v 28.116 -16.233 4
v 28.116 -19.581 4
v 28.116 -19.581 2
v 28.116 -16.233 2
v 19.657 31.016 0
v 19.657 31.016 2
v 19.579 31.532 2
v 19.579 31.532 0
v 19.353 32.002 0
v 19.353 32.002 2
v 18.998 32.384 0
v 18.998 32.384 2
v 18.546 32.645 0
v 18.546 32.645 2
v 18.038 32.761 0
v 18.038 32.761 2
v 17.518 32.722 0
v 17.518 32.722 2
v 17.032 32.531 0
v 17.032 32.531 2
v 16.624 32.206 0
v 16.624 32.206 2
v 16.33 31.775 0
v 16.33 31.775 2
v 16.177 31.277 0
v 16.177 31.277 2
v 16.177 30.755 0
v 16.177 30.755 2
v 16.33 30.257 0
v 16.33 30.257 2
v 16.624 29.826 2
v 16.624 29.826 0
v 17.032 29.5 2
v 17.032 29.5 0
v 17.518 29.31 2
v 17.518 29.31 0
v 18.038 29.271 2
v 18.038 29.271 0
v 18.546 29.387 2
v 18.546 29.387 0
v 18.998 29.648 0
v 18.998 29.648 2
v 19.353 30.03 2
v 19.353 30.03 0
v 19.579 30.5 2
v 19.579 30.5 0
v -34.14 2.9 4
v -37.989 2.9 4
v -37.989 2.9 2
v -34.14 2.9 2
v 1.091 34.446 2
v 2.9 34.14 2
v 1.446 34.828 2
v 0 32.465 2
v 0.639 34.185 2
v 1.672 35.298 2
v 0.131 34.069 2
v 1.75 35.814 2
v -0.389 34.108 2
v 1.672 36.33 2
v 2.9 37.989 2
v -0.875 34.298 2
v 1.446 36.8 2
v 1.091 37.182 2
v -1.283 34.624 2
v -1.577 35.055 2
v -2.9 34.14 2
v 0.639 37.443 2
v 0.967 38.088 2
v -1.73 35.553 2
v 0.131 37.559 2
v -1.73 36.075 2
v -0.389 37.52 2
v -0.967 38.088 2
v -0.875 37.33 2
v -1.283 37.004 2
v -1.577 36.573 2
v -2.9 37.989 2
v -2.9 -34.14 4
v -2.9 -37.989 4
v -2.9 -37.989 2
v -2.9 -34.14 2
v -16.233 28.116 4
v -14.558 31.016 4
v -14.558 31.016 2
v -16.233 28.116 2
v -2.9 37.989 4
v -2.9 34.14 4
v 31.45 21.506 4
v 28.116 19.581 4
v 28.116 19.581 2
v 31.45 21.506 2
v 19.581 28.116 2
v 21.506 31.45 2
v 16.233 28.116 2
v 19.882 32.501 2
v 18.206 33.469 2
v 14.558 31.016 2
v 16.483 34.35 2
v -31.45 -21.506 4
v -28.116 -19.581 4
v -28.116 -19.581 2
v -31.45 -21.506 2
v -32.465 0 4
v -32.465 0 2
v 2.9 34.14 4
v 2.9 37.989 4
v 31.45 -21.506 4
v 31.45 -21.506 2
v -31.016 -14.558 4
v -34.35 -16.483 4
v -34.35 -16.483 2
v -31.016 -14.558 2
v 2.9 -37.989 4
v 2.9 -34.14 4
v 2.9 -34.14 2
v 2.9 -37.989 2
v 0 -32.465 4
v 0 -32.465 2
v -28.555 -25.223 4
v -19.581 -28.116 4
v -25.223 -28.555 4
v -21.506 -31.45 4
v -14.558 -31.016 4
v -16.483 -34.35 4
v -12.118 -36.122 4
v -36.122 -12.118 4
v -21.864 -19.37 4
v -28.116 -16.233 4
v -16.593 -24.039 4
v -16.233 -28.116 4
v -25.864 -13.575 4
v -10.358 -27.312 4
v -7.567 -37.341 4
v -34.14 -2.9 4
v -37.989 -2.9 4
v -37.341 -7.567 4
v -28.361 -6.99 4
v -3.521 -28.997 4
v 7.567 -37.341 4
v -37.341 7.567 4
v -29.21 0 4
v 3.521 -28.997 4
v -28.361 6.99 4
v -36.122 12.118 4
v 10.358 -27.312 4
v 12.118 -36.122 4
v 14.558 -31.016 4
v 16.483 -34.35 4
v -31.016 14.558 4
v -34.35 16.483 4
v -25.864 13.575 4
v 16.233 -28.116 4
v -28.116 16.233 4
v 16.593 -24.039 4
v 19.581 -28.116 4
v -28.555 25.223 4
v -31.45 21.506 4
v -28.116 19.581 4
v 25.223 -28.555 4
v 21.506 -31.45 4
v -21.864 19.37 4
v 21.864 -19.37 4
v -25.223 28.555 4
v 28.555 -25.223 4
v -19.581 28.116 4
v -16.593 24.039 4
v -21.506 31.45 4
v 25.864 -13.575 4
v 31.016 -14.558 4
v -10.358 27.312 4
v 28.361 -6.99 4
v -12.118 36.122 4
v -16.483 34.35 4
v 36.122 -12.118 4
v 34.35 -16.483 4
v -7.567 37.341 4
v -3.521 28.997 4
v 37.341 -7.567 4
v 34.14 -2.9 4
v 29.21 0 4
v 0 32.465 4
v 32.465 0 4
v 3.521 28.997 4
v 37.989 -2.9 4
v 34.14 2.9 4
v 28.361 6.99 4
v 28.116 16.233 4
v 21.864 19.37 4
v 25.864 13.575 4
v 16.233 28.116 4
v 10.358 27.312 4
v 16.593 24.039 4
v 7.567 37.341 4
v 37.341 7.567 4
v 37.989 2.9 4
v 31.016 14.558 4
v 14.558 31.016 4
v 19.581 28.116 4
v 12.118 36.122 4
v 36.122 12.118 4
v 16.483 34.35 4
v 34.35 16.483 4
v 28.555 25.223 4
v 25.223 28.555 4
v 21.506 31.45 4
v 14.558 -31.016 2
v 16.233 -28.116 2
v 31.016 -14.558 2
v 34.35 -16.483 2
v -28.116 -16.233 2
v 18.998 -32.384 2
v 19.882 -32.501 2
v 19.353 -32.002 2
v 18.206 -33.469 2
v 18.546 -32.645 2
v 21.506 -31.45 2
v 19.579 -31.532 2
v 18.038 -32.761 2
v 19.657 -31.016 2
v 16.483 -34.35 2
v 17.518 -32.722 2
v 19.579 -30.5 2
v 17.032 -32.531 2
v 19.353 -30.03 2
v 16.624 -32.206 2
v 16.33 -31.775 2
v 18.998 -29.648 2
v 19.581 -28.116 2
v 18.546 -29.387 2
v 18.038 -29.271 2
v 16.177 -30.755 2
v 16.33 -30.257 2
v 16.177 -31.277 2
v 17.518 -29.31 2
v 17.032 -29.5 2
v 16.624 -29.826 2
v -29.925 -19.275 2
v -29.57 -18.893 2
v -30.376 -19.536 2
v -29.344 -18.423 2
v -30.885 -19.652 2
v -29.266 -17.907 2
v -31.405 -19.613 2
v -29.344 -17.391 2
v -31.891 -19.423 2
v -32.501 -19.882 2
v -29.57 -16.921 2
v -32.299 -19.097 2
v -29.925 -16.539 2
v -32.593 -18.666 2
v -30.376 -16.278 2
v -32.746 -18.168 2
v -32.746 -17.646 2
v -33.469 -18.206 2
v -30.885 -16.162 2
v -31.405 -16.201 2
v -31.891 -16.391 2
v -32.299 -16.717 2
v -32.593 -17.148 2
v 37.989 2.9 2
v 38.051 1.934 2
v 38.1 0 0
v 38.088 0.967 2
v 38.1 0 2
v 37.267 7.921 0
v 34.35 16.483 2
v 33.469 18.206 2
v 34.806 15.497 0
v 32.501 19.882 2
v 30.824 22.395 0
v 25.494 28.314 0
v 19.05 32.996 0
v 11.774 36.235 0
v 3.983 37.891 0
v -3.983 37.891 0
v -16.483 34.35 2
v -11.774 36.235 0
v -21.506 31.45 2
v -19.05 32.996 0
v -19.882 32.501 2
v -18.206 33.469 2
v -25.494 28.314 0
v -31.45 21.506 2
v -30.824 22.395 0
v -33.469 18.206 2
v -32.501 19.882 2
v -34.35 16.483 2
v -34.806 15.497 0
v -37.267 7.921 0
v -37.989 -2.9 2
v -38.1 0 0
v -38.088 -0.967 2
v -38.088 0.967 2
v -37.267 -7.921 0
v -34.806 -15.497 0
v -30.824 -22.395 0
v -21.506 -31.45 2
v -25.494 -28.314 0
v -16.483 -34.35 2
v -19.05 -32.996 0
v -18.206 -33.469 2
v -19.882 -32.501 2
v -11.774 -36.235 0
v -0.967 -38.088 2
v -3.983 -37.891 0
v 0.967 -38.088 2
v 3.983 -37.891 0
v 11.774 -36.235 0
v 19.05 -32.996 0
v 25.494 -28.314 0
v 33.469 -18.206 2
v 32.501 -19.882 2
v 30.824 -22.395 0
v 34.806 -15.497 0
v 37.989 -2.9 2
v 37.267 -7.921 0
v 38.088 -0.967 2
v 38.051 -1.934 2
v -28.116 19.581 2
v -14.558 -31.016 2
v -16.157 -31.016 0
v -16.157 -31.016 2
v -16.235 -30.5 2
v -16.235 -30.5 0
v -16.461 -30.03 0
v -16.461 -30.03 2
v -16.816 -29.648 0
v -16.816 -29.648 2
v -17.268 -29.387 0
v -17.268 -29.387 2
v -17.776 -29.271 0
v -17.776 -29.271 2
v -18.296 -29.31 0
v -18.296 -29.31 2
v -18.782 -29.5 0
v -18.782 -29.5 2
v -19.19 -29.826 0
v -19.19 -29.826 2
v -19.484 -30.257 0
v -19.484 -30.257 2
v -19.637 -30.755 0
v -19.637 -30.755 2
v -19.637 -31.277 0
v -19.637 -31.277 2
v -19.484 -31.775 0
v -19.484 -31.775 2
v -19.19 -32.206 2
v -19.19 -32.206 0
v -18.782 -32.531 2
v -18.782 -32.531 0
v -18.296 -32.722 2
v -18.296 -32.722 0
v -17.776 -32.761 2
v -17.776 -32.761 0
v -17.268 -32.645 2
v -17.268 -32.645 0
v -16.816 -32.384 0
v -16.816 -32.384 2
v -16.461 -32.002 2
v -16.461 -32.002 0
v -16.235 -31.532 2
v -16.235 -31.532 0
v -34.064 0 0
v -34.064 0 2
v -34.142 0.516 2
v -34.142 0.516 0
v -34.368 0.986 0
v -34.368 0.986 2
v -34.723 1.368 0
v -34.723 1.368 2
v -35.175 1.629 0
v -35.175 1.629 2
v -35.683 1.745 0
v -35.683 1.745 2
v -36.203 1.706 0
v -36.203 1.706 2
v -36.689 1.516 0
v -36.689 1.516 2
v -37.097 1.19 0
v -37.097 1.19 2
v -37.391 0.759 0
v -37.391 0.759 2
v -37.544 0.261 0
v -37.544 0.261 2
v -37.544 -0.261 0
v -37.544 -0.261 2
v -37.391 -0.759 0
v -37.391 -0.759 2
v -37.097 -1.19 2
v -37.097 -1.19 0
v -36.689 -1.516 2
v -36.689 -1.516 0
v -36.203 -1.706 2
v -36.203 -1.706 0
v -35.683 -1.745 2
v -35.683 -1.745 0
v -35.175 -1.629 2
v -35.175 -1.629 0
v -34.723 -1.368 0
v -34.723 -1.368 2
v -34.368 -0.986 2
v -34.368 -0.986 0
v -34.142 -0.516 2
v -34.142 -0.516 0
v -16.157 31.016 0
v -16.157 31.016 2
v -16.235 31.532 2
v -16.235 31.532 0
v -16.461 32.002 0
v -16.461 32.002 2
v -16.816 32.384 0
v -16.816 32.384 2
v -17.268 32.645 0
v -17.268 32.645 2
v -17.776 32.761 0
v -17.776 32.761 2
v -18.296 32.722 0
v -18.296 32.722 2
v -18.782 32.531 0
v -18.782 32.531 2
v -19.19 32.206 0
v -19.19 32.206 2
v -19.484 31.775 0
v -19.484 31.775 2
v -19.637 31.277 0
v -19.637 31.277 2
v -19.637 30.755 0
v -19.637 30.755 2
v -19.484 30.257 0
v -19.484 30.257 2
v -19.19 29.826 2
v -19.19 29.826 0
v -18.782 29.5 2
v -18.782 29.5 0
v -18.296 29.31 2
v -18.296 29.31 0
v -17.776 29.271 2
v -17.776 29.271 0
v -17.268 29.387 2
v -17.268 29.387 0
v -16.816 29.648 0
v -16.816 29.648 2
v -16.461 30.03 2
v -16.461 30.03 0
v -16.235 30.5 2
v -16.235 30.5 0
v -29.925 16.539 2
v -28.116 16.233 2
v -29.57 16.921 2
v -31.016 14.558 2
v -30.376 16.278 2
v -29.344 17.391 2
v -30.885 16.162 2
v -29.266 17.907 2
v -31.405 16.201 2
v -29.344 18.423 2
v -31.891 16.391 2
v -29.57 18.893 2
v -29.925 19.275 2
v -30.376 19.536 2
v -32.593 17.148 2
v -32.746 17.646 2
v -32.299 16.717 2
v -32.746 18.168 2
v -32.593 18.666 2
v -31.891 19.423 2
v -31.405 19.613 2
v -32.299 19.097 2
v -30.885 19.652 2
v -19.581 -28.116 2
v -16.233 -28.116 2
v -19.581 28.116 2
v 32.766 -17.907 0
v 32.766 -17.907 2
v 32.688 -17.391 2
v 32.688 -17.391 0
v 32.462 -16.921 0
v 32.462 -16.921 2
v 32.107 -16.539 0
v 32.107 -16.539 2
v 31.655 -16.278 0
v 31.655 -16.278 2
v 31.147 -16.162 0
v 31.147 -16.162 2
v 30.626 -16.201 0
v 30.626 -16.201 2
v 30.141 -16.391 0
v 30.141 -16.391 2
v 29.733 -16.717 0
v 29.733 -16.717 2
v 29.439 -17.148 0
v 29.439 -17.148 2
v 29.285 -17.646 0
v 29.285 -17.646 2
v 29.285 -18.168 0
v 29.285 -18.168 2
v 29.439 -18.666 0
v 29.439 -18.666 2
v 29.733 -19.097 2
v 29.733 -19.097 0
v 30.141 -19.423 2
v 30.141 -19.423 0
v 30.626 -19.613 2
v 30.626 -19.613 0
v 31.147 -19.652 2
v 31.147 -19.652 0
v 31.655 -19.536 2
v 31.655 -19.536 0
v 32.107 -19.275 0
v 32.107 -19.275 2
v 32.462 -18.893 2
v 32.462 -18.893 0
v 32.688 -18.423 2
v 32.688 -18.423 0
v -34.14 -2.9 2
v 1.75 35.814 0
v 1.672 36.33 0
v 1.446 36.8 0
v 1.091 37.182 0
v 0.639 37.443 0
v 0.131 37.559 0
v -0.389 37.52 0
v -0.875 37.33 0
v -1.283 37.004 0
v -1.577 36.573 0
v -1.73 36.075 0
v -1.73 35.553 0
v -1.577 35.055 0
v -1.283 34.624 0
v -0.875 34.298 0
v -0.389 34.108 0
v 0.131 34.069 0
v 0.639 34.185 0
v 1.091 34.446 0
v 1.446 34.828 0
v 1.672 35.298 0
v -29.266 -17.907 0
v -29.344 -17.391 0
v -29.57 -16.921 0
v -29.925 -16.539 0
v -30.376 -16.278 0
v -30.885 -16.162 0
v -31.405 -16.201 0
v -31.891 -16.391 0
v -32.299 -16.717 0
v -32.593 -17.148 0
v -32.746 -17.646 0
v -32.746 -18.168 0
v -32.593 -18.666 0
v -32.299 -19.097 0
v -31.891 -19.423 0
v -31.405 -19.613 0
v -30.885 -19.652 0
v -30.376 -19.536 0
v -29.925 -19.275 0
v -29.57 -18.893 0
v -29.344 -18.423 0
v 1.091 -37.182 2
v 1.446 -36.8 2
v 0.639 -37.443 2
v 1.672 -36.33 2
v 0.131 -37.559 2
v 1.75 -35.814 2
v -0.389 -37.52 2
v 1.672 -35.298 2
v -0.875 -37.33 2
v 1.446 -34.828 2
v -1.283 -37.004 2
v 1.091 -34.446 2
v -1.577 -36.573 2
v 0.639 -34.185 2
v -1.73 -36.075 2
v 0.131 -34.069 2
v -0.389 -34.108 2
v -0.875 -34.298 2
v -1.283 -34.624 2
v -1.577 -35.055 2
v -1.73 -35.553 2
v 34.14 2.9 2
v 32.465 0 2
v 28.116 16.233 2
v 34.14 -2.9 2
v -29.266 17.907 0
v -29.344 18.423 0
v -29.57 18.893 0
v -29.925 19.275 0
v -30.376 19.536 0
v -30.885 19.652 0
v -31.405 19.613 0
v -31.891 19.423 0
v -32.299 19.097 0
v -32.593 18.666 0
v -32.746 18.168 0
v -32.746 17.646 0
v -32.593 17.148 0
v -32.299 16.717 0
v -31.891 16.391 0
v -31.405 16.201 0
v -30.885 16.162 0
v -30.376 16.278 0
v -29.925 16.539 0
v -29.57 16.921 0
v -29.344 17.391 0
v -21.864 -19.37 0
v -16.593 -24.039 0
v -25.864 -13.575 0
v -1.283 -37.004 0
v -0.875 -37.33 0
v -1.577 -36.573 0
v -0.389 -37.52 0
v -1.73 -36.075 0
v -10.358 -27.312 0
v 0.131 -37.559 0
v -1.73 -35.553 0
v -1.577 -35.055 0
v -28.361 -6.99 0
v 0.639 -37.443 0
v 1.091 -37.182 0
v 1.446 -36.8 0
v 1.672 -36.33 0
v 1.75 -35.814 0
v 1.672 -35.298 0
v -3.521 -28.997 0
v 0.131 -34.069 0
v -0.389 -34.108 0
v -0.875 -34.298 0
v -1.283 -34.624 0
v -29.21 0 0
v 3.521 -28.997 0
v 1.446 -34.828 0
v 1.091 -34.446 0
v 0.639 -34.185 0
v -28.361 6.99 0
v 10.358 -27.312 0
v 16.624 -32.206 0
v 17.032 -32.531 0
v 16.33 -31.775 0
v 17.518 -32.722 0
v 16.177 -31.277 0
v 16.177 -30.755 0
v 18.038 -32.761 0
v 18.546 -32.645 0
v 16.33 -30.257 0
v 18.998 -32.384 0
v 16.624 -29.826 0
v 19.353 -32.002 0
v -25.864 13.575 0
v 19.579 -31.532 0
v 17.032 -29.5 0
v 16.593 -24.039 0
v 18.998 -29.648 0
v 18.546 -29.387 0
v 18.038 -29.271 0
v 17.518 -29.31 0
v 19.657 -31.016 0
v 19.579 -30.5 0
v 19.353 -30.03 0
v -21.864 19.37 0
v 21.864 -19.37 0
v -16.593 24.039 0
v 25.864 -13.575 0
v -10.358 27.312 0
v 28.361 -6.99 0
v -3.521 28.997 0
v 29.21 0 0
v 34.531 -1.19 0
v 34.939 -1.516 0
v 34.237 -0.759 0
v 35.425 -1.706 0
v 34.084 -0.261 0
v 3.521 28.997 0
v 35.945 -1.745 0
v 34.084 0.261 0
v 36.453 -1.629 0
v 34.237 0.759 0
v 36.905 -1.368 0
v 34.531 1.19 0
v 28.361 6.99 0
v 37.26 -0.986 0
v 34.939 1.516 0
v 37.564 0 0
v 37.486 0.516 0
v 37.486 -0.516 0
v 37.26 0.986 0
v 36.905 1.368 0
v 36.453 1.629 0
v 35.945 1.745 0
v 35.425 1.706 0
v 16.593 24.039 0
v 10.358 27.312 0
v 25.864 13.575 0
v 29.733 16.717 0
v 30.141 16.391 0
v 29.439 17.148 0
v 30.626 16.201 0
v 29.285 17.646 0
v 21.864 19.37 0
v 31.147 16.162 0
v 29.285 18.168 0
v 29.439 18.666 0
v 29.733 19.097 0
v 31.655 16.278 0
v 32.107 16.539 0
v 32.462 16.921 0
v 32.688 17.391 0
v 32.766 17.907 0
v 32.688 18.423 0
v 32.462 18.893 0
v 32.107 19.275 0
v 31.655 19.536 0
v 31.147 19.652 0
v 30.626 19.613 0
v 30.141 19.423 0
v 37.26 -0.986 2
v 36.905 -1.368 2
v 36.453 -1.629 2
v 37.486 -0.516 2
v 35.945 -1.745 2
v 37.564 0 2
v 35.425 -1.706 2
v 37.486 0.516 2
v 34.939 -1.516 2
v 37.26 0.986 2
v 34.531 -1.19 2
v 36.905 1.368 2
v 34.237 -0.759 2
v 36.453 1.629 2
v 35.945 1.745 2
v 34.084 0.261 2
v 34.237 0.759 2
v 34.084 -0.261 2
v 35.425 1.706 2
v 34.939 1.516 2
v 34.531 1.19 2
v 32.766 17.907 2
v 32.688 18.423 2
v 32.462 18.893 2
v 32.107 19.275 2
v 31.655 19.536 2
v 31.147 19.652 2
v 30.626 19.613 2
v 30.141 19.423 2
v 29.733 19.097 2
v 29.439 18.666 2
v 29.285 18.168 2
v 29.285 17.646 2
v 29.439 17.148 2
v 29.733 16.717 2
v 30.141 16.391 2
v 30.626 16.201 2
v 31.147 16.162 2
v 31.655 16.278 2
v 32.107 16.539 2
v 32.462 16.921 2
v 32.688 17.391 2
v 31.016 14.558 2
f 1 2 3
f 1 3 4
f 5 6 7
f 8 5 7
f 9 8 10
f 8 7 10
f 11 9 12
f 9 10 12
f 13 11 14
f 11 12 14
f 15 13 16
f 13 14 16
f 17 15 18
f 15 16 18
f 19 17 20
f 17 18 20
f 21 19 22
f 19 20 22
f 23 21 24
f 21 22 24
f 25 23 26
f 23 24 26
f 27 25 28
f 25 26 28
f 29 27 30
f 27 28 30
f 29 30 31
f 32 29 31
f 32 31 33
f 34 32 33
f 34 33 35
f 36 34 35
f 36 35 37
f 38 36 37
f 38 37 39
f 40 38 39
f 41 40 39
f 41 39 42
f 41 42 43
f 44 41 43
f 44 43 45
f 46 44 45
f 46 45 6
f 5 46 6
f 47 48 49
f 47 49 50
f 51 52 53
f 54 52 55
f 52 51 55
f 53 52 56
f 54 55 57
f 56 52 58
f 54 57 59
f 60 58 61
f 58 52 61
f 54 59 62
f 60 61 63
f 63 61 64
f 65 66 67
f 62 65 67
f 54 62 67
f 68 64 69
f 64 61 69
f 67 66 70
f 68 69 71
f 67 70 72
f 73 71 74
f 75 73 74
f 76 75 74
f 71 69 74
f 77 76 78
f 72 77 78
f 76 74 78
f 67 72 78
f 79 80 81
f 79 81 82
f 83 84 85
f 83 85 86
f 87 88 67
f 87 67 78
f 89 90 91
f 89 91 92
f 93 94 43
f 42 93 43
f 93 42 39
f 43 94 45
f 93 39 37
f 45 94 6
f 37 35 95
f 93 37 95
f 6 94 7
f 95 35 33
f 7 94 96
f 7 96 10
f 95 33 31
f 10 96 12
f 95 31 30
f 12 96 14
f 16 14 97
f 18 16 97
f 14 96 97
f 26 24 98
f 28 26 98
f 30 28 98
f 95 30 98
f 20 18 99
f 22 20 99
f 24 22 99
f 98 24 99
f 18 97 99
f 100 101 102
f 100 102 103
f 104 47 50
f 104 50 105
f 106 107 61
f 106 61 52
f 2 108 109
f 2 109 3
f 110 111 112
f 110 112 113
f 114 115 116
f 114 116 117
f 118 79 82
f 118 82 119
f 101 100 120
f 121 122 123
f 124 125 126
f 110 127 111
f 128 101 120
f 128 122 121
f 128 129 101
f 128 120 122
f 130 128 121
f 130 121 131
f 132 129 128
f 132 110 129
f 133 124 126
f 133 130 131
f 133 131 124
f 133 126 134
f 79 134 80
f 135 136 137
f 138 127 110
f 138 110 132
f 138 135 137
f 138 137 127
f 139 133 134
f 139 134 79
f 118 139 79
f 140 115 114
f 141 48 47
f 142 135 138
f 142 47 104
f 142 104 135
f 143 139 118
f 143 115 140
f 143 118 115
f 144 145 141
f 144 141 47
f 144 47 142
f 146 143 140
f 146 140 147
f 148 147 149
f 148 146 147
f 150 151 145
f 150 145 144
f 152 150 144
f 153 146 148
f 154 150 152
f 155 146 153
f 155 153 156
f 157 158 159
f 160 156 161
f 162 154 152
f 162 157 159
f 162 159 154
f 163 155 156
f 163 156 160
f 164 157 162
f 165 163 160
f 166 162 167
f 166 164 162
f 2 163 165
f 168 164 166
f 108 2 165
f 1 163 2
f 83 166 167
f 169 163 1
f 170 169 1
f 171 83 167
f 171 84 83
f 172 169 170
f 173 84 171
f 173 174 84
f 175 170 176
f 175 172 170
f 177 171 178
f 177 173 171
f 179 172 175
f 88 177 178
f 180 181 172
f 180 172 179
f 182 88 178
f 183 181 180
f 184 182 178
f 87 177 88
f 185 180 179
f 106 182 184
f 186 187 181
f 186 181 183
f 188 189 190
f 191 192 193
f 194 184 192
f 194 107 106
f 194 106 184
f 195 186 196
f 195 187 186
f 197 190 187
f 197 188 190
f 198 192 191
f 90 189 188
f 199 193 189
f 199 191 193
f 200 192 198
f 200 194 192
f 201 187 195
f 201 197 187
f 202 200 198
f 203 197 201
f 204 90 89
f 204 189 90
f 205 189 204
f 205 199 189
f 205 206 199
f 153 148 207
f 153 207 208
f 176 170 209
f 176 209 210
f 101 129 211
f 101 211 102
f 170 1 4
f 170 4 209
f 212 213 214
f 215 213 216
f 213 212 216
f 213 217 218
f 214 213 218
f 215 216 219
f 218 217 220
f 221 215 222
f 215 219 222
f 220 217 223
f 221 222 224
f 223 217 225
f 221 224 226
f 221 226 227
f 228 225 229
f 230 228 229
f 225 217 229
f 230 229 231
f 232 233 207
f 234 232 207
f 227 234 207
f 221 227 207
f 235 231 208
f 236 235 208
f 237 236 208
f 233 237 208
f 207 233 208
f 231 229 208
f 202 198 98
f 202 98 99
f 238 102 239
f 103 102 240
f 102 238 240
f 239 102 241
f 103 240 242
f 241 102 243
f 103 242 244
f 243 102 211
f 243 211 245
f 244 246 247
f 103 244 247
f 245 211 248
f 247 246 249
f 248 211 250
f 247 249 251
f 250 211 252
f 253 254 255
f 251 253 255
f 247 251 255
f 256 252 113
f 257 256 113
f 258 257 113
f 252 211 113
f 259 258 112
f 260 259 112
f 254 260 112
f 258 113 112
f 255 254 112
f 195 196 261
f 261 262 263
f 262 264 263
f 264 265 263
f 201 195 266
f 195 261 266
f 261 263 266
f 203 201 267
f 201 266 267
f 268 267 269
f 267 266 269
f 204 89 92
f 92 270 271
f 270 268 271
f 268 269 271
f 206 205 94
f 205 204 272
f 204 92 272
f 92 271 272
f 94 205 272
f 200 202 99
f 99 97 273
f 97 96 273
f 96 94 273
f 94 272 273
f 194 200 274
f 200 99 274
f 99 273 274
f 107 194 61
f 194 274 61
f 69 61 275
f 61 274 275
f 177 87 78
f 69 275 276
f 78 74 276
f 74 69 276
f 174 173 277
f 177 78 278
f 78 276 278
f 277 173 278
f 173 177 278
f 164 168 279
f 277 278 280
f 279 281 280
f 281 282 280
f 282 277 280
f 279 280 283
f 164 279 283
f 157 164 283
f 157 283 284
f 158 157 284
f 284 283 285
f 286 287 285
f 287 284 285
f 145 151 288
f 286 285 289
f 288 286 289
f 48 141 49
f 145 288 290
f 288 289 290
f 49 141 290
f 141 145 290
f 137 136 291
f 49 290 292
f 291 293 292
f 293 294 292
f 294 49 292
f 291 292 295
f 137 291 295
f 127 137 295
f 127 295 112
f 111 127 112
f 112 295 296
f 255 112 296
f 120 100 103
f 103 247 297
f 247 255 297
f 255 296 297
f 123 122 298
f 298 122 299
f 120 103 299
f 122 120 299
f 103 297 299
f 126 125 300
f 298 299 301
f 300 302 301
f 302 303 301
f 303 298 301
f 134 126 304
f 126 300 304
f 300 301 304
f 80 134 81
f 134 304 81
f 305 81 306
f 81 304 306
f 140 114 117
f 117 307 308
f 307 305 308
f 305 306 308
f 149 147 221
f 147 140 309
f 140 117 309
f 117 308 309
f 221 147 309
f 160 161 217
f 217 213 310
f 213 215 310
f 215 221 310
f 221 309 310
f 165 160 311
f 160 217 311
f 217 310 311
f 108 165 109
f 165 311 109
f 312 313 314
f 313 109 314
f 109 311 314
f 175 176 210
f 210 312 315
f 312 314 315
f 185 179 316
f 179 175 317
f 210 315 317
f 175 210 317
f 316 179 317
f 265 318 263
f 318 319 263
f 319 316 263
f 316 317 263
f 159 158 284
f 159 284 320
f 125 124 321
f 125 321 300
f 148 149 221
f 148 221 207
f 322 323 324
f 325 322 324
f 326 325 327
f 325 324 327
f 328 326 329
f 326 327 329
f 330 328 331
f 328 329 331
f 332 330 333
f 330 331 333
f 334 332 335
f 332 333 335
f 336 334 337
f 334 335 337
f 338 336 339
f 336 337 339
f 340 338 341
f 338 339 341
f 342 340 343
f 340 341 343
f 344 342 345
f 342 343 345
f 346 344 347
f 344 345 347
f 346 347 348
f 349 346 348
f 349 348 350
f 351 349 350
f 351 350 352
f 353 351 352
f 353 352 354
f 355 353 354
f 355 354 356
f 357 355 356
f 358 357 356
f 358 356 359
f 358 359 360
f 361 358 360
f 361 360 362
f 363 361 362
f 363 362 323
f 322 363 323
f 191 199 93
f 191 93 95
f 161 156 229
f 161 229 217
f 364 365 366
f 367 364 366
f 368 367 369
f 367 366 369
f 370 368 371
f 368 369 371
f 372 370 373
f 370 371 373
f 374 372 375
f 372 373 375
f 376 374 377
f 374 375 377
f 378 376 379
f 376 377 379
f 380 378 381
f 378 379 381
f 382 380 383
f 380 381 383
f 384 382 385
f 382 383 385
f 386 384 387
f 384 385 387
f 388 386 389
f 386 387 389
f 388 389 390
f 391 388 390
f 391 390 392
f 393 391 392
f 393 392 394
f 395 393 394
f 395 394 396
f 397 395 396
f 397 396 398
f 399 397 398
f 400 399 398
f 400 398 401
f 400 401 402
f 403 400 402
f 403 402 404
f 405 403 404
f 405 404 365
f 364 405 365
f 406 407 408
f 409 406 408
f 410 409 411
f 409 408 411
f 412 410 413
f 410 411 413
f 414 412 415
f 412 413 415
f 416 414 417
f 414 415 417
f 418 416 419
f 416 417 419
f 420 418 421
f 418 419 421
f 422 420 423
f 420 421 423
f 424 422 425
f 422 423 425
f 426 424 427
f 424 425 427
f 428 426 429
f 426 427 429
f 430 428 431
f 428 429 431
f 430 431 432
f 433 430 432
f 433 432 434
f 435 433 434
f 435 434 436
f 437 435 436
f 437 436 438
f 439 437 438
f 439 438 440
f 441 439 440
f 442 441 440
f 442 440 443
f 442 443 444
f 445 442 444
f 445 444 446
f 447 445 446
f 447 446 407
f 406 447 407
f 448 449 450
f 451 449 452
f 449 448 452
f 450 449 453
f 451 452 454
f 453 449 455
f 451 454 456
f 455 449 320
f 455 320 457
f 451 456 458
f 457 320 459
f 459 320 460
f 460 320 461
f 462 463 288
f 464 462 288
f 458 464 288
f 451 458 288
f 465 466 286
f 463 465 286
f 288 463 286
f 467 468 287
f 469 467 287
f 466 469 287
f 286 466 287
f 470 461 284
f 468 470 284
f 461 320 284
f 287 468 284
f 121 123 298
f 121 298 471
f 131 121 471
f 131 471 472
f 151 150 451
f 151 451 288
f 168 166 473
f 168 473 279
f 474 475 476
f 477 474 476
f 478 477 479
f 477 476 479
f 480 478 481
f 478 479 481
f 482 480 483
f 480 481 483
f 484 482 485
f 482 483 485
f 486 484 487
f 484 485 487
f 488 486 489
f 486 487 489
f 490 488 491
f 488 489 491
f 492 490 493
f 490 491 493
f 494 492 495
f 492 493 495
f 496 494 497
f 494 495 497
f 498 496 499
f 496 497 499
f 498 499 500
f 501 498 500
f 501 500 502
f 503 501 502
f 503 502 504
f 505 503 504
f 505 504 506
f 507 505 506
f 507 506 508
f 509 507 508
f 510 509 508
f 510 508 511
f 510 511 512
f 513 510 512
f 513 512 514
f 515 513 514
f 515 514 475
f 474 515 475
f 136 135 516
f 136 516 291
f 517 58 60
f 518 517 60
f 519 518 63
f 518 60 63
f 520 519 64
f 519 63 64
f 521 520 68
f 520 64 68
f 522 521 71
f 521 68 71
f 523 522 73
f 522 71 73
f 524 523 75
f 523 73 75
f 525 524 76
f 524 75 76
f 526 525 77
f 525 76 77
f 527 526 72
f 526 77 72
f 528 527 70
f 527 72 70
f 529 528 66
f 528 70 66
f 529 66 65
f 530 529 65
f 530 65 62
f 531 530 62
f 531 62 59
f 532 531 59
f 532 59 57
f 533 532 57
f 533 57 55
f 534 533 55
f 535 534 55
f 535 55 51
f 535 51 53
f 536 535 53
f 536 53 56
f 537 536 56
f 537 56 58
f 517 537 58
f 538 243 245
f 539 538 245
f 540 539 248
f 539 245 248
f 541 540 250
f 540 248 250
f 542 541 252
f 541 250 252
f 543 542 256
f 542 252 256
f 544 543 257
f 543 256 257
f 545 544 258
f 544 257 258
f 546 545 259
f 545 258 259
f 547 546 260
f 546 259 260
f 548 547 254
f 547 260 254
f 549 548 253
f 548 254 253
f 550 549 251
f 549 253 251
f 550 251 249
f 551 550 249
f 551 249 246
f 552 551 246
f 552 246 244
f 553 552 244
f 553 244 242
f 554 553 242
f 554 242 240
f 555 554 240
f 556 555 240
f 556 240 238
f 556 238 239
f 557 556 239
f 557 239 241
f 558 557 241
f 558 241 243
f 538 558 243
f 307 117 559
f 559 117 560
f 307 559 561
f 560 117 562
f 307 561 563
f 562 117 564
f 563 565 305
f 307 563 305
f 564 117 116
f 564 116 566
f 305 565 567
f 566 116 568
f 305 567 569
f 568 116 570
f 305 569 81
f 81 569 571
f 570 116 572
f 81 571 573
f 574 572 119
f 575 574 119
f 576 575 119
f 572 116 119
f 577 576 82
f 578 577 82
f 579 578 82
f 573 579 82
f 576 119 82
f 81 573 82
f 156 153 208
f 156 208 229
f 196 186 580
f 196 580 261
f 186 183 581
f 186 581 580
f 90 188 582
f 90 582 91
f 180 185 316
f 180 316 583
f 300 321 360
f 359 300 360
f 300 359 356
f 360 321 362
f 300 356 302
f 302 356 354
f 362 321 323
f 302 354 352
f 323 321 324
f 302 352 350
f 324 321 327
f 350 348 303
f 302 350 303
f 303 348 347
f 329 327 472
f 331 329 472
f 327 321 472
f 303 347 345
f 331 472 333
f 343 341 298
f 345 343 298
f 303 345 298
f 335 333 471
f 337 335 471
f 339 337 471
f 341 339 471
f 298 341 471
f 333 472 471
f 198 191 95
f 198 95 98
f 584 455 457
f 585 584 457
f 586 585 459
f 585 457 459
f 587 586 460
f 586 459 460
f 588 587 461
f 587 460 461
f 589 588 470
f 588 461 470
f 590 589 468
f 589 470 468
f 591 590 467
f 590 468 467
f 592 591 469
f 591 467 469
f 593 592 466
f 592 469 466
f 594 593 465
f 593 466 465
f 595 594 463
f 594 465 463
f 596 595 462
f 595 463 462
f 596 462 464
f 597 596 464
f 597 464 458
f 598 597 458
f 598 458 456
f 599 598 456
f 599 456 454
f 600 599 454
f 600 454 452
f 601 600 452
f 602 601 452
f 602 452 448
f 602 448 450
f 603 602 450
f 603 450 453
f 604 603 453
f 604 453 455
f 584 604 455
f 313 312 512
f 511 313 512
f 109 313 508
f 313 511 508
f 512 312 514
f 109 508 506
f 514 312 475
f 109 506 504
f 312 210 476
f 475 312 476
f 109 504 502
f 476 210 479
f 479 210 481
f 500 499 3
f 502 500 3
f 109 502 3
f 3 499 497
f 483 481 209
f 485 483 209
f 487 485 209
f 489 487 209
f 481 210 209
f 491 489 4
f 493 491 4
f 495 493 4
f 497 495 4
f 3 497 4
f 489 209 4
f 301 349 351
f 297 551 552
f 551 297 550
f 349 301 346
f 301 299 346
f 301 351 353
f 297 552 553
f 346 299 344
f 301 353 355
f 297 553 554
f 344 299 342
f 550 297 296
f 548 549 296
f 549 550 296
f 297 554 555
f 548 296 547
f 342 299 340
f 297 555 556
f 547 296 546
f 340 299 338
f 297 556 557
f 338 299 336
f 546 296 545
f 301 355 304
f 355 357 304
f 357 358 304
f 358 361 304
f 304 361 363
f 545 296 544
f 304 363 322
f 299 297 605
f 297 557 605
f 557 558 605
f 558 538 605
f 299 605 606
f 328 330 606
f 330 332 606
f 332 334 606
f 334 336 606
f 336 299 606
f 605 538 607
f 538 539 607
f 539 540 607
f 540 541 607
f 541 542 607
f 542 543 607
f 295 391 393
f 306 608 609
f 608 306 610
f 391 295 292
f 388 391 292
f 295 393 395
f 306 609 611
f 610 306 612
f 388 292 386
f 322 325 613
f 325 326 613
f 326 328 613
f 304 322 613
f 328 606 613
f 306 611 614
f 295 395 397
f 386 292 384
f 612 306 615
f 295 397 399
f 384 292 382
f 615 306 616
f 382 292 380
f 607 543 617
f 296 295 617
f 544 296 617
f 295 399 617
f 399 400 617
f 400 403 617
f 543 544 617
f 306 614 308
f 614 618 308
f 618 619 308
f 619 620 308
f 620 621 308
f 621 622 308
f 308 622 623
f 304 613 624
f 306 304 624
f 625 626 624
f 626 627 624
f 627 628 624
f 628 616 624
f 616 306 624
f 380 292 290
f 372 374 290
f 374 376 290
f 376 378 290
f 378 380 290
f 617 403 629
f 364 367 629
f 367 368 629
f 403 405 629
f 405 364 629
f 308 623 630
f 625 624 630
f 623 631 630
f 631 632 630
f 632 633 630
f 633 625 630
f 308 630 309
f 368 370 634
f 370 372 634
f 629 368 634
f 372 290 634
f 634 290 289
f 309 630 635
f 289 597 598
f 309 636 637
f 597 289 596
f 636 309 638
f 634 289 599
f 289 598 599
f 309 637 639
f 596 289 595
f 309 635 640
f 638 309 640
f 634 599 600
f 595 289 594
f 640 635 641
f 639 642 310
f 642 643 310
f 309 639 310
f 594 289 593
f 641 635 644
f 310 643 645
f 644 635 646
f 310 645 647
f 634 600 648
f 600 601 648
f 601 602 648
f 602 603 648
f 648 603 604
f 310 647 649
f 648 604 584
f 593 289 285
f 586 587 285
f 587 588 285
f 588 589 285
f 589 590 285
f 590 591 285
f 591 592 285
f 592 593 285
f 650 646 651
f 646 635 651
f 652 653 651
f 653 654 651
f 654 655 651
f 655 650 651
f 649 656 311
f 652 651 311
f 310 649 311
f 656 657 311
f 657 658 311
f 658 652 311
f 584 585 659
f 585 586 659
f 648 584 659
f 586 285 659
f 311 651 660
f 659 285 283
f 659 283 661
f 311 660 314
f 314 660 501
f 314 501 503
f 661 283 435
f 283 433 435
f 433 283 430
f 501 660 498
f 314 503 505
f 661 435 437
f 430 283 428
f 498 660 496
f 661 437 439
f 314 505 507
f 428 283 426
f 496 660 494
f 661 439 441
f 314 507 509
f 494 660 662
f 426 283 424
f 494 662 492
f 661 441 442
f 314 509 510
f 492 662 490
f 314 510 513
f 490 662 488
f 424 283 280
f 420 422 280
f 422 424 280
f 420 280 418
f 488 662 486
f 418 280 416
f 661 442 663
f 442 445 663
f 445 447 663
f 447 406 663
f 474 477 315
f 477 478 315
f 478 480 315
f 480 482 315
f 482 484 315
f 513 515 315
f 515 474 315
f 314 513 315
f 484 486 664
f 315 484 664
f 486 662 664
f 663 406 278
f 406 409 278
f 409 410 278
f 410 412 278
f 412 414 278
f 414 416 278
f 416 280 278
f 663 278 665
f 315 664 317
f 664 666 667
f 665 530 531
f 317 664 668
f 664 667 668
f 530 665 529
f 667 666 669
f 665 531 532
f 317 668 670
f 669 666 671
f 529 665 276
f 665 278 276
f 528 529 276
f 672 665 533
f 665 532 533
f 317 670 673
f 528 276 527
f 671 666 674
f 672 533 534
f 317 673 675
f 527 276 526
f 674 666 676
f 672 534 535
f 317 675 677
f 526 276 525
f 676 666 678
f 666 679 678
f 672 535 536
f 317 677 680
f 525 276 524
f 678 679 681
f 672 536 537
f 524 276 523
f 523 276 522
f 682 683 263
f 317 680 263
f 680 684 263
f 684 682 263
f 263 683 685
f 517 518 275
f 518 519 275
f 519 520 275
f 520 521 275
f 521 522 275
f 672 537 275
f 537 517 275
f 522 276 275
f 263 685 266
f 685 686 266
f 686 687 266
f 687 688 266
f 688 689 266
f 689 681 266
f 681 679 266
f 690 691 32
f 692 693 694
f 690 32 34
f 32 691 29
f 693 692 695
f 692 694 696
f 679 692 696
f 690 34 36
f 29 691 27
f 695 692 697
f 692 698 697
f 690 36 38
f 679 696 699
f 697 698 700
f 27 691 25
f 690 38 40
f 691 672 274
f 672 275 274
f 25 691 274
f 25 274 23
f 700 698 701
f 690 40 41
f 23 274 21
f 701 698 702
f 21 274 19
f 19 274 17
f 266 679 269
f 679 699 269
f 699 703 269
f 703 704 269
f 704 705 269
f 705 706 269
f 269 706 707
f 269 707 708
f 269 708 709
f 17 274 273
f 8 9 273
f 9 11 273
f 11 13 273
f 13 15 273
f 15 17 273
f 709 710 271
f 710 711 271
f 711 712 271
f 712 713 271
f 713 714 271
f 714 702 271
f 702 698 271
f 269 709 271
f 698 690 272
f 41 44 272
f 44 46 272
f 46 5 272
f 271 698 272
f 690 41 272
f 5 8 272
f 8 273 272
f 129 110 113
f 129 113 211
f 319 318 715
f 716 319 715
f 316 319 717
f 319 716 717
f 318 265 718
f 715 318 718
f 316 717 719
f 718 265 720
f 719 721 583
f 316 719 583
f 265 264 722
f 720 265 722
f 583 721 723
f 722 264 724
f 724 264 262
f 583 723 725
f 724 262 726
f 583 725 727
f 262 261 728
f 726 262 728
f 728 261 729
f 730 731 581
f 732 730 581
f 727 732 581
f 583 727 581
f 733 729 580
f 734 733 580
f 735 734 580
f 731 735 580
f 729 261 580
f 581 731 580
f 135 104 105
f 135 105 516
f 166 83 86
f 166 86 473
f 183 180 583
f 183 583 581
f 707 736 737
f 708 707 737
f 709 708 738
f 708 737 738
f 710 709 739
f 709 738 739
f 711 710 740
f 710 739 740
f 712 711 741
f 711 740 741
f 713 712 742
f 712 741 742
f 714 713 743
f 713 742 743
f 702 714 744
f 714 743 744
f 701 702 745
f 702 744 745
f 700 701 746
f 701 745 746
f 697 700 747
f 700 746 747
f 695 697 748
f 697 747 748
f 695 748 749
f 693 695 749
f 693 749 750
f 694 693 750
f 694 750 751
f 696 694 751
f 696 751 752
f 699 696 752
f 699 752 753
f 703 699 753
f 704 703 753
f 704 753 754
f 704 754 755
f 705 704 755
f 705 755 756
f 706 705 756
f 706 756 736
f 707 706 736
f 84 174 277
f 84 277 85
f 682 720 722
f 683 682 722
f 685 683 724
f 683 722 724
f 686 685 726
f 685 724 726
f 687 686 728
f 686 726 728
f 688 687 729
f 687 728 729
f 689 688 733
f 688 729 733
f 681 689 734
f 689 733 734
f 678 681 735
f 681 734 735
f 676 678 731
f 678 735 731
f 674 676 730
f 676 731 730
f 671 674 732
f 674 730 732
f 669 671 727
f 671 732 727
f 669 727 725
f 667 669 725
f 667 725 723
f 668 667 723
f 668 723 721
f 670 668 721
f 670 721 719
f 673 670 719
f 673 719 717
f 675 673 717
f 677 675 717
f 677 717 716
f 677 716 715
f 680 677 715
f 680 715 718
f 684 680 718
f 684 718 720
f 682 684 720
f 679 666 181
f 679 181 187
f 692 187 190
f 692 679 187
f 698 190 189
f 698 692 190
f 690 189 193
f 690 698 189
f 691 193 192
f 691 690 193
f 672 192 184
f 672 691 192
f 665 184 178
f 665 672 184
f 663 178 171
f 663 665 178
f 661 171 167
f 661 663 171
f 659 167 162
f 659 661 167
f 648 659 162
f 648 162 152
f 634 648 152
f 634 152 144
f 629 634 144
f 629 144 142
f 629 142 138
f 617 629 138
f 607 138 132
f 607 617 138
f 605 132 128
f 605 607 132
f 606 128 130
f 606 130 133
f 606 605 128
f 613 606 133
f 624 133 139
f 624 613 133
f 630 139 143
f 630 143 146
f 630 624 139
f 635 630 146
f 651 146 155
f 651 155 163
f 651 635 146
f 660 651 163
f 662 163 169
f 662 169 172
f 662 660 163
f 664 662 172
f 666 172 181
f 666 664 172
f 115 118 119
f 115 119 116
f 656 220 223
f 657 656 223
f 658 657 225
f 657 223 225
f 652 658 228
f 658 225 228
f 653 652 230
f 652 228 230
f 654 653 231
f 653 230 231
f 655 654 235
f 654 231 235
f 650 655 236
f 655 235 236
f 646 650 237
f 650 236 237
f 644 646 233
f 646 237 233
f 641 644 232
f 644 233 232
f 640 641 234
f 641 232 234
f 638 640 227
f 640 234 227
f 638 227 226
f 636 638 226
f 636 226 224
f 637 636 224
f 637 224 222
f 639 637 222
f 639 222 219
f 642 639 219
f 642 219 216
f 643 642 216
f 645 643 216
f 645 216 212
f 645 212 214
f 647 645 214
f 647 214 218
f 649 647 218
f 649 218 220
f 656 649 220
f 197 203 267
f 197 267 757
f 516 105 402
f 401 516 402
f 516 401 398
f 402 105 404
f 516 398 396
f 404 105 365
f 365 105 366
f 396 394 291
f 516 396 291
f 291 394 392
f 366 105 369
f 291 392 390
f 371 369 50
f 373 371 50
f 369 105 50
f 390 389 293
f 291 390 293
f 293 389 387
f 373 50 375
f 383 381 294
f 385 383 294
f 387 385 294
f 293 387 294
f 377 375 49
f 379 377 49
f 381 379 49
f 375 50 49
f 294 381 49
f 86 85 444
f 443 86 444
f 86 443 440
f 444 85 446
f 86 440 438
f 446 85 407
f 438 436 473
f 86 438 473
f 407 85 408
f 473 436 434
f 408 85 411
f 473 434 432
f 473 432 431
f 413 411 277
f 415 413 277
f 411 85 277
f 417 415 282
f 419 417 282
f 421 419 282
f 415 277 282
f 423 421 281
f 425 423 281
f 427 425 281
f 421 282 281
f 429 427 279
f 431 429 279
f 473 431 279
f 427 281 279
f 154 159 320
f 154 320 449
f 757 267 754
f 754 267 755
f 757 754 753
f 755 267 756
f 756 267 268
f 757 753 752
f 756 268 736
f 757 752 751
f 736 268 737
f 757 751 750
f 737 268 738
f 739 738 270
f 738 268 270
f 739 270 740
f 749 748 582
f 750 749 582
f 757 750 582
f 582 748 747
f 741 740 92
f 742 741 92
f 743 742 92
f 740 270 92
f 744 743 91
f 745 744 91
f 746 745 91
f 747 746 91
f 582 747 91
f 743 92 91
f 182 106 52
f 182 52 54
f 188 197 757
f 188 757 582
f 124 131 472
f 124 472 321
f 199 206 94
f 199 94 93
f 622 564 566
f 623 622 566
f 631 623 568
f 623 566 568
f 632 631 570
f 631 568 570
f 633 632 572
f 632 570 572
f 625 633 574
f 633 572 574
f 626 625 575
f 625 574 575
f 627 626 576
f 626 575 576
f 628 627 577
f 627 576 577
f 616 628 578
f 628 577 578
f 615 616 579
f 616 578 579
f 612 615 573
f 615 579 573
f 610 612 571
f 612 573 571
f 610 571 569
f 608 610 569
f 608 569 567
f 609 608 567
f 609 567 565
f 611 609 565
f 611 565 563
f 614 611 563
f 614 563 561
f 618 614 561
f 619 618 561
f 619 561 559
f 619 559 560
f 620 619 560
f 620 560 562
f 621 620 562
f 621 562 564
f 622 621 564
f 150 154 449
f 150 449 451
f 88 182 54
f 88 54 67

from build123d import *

# Parameters (mm, degrees)
SKETCH1_R           = 38.1
SKETCH1_R_2         = 29.21
BOSS_EXTRUDE1_DEPTH = 4
SKETCH2_R           = 1.75
CUT_EXTRUDE1_DEPTH  = 5
CUT_EXTRUDE2_DEPTH  = 2


with BuildPart() as part:
    # Sketch1 → Boss-Extrude1 (new body)
    with BuildSketch(Plane.XY):
        Circle(SKETCH1_R)
        Circle(SKETCH1_R_2, mode=Mode.SUBTRACT)
    extrude(amount=BOSS_EXTRUDE1_DEPTH)

    # Sketch2 → Cut-Extrude1 (cut, through all)
    with BuildSketch(Plane.XY.offset(4)):
        with Locations((0, 35.814)):
            Circle(SKETCH2_R)
        with Locations((17.907, 31.015833811)):
            Circle(SKETCH2_R)
        with Locations((31.015833811, 17.907)):
            Circle(SKETCH2_R)
        with Locations((35.814, 0)):
            Circle(SKETCH2_R)
        with Locations((31.015833811, -17.907)):
            Circle(SKETCH2_R)
        with Locations((17.907, -31.015833811)):
            Circle(SKETCH2_R)
        with Locations((0, -35.814)):
            Circle(SKETCH2_R)
        with Locations((-17.907, -31.015833811)):
            Circle(SKETCH2_R)
        with Locations((-31.015833811, -17.907)):
            Circle(SKETCH2_R)
        with Locations((-35.814, 0)):
            Circle(SKETCH2_R)
        with Locations((-31.015833811, 17.907)):
            Circle(SKETCH2_R)
        with Locations((-17.907, 31.015833811)):
            Circle(SKETCH2_R)
    extrude(amount=-CUT_EXTRUDE1_DEPTH, mode=Mode.SUBTRACT)

    # Sketch3 → Cut-Extrude2 (cut)
    with BuildSketch(Plane.XY.offset(4)):
        Polygon((-2.9, 37.989472226), (0, 39.162631561), (2.9, 37.989472226), (2.9, 34.139684219), (0, 32.465368439), (-2.9, 34.139684219), align=None)
        Polygon((16.483262442, 34.349848024), (19.581315781, 33.915833811), (21.506209784, 31.449848024), (19.581315781, 28.115833811), (16.232684219, 28.115833811), (14.558368439, 31.015833811), align=None)
        Polygon((31.449848024, 21.506209784), (33.915833811, 19.581315781), (34.349848024, 16.483262442), (31.015833811, 14.558368439), (28.115833811, 16.232684219), (28.115833811, 19.581315781), align=None)
        Polygon((37.989472226, 2.9), (39.162631561, 0), (37.989472226, -2.9), (34.139684219, -2.9), (32.465368439, 0), (34.139684219, 2.9), align=None)
        Polygon((34.349848024, -16.483262442), (33.915833811, -19.581315781), (31.449848024, -21.506209784), (28.115833811, -19.581315781), (28.115833811, -16.232684219), (31.015833811, -14.558368439), align=None)
        Polygon((21.506209784, -31.449848024), (19.581315781, -33.915833811), (16.483262442, -34.349848024), (14.558368439, -31.015833811), (16.232684219, -28.115833811), (19.581315781, -28.115833811), align=None)
        Polygon((2.9, -37.989472226), (0, -39.162631561), (-2.9, -37.989472226), (-2.9, -34.139684219), (0, -32.465368439), (2.9, -34.139684219), align=None)
        Polygon((-16.483262442, -34.349848024), (-19.581315781, -33.915833811), (-21.506209784, -31.449848024), (-19.581315781, -28.115833811), (-16.232684219, -28.115833811), (-14.558368439, -31.015833811), align=None)
        Polygon((-31.449848024, -21.506209784), (-33.915833811, -19.581315781), (-34.349848024, -16.483262442), (-31.015833811, -14.558368439), (-28.115833811, -16.232684219), (-28.115833811, -19.581315781), align=None)
        Polygon((-37.989472226, -2.9), (-39.162631561, 0), (-37.989472226, 2.9), (-34.139684219, 2.9), (-32.465368439, 0), (-34.139684219, -2.9), align=None)
        Polygon((-34.349848024, 16.483262442), (-33.915833811, 19.581315781), (-31.449848024, 21.506209784), (-28.115833811, 19.581315781), (-28.115833811, 16.232684219), (-31.015833811, 14.558368439), align=None)
        Polygon((-21.506209784, 31.449848024), (-19.581315781, 33.915833811), (-16.483262442, 34.349848024), (-14.558368439, 31.015833811), (-16.232684219, 28.115833811), (-19.581315781, 28.115833811), align=None)
    extrude(amount=-CUT_EXTRUDE2_DEPTH, mode=Mode.SUBTRACT)


solid = part.part
